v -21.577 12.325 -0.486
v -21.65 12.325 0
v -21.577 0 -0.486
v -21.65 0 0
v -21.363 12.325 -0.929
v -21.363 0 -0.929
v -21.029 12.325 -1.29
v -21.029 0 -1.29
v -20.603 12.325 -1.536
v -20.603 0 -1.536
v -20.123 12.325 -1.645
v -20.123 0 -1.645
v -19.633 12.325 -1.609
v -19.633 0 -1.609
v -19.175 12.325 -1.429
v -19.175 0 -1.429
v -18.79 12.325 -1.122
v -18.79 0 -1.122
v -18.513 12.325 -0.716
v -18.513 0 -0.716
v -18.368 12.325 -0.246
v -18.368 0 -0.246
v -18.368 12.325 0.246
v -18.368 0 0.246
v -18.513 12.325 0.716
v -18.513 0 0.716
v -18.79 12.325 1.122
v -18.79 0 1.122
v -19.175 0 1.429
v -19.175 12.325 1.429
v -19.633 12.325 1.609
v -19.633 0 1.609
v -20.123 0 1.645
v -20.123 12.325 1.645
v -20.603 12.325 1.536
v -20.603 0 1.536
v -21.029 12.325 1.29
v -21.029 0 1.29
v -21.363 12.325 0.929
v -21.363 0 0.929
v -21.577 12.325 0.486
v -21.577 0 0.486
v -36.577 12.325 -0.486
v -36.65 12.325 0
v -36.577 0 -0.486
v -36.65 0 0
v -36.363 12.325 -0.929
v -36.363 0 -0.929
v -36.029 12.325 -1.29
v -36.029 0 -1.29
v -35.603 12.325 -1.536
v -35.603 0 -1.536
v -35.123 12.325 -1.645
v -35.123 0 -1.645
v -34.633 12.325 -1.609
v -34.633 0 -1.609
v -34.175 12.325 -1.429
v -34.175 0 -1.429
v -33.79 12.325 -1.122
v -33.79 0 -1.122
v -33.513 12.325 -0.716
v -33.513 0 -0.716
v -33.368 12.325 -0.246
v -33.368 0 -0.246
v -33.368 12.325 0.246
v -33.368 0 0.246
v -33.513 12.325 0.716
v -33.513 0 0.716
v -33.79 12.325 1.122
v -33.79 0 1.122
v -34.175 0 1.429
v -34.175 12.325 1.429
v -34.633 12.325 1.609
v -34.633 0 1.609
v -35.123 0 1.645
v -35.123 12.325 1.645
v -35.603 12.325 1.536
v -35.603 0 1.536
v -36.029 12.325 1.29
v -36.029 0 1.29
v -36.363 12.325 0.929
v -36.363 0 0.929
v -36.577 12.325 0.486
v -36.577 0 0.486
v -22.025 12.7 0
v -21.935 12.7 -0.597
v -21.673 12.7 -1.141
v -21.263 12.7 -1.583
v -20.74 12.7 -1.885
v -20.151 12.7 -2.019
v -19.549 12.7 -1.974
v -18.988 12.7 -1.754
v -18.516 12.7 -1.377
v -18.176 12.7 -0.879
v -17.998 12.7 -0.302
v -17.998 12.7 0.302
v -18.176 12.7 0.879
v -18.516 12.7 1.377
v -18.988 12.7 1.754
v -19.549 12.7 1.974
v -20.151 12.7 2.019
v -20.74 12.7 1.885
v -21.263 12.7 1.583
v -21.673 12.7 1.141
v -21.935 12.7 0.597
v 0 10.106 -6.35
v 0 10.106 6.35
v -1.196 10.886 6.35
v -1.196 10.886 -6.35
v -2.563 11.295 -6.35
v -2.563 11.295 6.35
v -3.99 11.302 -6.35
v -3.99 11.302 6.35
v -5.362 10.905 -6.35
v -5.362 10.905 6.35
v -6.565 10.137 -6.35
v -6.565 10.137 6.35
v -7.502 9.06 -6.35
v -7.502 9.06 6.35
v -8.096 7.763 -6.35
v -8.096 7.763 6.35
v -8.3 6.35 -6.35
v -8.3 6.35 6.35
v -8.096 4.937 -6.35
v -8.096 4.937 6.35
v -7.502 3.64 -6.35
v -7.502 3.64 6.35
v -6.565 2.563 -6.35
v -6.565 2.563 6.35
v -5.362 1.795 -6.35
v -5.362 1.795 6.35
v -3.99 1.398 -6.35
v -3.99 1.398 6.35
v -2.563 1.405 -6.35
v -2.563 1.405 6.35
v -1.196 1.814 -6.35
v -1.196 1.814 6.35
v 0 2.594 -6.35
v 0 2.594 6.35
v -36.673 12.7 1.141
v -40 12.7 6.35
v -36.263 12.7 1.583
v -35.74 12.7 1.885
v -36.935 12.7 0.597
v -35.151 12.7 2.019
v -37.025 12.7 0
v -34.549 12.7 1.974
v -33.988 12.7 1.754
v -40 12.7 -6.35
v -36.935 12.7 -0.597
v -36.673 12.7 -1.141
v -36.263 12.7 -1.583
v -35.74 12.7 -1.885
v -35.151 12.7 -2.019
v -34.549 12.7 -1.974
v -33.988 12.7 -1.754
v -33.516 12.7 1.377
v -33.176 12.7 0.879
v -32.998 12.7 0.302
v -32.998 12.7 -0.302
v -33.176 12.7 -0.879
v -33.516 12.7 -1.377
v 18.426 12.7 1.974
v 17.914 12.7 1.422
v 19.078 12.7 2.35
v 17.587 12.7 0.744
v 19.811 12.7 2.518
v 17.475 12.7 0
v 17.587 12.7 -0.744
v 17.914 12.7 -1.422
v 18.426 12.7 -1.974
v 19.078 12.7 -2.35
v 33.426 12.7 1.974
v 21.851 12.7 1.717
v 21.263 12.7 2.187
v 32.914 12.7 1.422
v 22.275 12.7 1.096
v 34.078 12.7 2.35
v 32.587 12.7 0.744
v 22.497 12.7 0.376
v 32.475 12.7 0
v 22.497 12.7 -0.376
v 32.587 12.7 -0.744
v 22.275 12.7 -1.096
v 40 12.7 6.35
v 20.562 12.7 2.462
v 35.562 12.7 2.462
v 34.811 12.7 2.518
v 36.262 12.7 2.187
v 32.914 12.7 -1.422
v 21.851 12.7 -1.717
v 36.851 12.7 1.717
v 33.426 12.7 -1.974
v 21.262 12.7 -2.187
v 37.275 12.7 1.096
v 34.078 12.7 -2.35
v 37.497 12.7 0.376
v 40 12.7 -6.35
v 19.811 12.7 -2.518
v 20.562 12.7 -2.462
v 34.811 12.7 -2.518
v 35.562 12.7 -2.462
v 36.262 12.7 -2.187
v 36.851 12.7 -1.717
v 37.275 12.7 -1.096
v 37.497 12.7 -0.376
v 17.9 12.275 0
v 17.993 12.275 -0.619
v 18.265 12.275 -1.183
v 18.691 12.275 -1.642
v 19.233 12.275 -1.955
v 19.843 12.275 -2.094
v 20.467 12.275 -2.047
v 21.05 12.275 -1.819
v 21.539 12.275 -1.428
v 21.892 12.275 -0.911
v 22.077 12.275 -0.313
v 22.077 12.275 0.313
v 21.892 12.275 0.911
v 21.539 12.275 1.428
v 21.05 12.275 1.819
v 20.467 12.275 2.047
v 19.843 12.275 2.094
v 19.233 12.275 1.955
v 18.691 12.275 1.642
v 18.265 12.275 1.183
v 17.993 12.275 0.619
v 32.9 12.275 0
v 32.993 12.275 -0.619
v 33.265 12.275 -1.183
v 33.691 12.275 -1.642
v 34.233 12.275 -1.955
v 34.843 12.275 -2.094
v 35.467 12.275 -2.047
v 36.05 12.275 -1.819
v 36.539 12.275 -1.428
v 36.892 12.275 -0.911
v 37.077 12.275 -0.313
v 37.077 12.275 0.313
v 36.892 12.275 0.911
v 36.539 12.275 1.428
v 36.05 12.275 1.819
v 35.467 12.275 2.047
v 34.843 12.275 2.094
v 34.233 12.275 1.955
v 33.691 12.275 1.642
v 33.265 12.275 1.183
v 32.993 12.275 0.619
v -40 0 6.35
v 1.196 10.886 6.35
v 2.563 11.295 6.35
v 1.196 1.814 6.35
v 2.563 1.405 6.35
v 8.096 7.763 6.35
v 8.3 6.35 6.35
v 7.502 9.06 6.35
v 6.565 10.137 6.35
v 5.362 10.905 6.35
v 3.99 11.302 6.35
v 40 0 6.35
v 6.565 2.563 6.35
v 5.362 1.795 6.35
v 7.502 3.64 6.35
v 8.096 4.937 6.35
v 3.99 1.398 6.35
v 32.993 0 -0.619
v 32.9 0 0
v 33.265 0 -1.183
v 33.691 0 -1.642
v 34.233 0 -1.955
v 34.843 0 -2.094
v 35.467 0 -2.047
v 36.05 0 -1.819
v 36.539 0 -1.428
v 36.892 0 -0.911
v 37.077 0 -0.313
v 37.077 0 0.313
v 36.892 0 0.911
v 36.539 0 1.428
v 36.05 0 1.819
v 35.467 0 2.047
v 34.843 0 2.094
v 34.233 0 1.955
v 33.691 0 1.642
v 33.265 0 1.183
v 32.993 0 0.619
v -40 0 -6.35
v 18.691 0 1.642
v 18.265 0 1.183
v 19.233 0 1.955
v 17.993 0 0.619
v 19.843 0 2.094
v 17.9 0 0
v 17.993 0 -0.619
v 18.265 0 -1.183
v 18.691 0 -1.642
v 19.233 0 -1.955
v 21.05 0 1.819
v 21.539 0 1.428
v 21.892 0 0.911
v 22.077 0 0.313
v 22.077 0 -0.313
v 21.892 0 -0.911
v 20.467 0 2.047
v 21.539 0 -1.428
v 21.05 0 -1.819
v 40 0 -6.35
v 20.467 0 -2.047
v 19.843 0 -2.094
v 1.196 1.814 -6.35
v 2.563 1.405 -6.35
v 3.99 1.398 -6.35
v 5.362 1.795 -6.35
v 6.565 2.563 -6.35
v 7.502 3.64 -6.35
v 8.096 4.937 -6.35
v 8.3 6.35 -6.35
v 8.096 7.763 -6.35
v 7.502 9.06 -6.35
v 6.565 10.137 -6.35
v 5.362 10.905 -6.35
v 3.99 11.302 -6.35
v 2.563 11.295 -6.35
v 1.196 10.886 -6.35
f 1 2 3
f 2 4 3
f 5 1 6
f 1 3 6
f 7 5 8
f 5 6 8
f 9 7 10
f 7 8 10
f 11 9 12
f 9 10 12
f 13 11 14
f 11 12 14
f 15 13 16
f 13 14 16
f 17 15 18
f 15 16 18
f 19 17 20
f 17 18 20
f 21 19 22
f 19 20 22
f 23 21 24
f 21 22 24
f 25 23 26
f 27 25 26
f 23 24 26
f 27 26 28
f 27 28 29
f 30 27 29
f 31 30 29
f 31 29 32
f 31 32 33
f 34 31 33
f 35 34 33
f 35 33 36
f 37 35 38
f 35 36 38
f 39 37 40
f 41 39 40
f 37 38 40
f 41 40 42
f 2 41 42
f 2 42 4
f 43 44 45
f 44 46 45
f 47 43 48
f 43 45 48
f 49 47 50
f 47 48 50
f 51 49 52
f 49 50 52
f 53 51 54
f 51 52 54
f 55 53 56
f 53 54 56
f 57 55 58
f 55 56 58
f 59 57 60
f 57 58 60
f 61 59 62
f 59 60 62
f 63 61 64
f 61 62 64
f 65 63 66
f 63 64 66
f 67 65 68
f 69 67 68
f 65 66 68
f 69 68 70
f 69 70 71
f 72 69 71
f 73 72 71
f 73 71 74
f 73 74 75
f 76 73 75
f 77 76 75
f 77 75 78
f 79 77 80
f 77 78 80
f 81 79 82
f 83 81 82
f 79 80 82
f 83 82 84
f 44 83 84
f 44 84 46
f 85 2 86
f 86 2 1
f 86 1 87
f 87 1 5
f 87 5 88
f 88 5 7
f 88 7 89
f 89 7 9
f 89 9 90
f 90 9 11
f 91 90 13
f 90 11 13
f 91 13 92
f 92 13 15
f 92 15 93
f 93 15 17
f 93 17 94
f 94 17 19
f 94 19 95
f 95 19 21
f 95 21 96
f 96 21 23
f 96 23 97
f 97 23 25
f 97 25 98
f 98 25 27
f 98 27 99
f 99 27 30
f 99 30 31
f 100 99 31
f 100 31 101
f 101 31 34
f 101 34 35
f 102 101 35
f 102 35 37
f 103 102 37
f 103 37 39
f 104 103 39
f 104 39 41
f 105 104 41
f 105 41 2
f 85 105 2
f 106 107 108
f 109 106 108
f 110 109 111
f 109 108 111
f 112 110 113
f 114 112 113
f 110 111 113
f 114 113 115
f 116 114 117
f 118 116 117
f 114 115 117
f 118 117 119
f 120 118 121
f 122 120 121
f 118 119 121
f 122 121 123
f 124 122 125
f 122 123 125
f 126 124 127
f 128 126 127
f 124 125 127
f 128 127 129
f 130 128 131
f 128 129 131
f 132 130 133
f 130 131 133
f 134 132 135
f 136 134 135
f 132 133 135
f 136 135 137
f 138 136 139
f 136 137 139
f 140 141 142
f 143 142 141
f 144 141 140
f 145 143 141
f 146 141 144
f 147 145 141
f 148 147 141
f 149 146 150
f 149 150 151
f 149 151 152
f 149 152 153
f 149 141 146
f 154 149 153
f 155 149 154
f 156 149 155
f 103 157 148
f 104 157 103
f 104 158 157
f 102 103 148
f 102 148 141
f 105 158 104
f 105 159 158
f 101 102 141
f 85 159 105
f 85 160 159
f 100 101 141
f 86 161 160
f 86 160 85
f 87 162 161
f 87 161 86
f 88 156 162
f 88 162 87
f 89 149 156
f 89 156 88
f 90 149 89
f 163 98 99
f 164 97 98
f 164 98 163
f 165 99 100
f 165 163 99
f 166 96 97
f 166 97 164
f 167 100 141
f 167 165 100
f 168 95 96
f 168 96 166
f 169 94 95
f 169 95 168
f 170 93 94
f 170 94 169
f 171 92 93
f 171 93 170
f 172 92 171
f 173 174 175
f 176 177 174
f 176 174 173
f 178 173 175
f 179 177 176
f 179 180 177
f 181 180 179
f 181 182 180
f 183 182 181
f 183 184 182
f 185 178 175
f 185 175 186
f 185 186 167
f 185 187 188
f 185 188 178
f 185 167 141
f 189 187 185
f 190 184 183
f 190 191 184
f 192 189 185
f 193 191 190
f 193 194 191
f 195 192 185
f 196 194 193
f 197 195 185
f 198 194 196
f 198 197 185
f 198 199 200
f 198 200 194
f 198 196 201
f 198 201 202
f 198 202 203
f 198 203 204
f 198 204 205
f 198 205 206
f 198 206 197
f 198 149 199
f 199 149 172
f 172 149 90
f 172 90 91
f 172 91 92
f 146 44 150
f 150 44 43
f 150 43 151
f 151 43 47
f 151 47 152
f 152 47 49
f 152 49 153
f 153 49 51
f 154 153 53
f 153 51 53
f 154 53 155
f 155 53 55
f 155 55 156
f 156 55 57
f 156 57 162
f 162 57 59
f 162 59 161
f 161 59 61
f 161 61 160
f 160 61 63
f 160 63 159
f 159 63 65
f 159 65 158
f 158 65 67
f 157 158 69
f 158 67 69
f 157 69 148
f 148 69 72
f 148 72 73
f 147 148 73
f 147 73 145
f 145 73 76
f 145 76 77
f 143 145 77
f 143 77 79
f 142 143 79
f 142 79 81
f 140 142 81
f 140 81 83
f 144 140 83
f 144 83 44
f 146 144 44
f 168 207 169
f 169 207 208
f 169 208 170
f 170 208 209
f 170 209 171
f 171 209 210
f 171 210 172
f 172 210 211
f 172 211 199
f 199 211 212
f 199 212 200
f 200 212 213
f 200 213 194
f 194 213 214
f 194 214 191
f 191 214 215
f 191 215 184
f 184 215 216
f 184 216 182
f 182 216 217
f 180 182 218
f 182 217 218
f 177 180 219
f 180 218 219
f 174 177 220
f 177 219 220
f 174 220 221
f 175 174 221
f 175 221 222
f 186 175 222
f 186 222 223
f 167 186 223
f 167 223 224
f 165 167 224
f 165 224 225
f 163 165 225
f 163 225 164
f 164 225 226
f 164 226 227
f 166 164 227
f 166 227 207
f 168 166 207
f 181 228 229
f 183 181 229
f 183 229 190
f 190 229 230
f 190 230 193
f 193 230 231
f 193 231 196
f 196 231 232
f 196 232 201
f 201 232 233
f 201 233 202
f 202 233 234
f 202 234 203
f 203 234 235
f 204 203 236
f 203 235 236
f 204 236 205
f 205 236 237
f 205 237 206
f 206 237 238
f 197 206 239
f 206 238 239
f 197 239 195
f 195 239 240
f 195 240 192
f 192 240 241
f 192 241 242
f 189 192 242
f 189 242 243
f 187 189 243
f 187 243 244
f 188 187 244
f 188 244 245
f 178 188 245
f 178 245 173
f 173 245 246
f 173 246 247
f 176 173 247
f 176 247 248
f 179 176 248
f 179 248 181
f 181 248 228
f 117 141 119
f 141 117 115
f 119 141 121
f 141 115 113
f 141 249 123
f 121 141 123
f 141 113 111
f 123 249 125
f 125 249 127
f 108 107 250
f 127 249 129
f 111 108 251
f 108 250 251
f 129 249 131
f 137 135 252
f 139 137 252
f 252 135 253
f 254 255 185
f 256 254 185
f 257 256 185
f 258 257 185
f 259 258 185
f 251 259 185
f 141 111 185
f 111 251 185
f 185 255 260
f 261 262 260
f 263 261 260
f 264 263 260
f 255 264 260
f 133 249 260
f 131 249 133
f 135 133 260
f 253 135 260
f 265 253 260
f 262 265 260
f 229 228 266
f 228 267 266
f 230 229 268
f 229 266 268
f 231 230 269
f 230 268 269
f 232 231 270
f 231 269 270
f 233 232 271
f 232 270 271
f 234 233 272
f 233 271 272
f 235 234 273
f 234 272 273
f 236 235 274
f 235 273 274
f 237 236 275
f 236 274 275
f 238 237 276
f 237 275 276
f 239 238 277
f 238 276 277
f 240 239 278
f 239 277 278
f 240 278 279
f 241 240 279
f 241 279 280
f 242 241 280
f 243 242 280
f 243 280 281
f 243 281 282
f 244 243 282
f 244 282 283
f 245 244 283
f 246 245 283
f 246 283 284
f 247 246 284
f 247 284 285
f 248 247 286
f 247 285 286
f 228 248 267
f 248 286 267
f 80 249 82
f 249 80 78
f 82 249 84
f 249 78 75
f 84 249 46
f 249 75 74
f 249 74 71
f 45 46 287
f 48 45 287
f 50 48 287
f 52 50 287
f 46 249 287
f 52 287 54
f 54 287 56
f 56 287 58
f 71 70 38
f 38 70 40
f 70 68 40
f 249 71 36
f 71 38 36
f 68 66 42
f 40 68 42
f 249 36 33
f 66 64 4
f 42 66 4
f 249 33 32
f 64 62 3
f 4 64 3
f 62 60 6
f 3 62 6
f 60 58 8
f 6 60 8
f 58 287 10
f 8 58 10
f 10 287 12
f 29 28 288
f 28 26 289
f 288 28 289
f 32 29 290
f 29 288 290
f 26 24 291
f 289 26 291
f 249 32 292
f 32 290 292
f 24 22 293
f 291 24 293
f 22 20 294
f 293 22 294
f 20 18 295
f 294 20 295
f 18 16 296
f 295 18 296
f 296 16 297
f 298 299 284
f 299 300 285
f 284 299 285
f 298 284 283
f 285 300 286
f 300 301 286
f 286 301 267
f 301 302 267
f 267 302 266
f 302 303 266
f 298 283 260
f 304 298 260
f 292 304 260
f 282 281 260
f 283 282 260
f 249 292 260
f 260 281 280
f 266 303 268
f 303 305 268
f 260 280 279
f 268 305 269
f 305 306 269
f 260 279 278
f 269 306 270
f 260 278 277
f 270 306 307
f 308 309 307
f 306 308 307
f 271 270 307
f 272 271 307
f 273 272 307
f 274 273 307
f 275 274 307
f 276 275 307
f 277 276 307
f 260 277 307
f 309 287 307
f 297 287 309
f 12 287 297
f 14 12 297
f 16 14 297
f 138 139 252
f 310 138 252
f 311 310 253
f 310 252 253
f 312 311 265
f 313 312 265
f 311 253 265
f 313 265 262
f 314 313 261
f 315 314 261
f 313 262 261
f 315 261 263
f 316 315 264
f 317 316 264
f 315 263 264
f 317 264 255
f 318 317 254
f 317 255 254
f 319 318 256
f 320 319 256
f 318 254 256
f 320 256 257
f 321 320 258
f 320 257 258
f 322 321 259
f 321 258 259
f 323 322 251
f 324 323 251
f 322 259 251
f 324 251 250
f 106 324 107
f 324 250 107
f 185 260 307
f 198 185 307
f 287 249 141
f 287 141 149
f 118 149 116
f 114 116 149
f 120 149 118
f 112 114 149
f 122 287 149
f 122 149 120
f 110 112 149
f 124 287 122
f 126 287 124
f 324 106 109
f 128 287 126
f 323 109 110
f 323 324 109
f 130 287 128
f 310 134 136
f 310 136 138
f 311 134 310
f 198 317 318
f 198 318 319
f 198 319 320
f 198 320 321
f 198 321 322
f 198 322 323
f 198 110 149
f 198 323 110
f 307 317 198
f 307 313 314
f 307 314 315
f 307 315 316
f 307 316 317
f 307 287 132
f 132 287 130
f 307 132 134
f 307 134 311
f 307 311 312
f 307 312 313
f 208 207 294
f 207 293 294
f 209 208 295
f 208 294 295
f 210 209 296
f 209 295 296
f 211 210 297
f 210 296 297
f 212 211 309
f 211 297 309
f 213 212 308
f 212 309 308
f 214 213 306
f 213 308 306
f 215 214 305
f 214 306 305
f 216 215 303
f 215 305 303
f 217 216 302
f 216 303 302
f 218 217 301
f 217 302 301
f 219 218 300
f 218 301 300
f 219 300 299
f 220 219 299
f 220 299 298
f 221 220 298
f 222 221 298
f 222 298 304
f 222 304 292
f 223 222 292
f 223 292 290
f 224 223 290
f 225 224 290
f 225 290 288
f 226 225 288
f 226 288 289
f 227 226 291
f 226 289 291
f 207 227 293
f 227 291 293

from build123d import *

# Parameters (mm, degrees)
SKETCH1_W                   = 80
SKETCH1_H                   = 12.7
BOSS_EXTRUDE1_DEPTH         = 12.7
CUT_EXTRUDE1_DEPTH          = 44.847234804
M4_TAPPED_HOLE2_D           = 3.3
M4_TAPPED_HOLE2_CSINK_D     = 4.05
M4_TAPPED_HOLE2_CSINK_ANGLE = 90
M5_TAPPED_HOLE1_D           = 4.2
M5_TAPPED_HOLE1_CSINK_D     = 5.05
M5_TAPPED_HOLE1_CSINK_ANGLE = 90


with BuildPart() as part:
    # Sketch1 → Boss-Extrude1 (new body)
    with BuildSketch(Plane(origin=(0, 0, 0), x_dir=(1, 0, 0), z_dir=(0, 1, 0))):
        Rectangle(SKETCH1_W, SKETCH1_H)
    extrude(amount=BOSS_EXTRUDE1_DEPTH)

    # Sketch4 → Cut-Extrude1 (cut, through all)
    with BuildSketch(Plane.XY.offset(6.35)):
        with BuildLine():
            ThreePointArc((0, 2.593672006), (8.3, 6.35), (0, 10.106327994))
            ThreePointArc((0, 10.106327994), (-8.3, 6.35), (0, 2.593672006))
        make_face()
    extrude(amount=-CUT_EXTRUDE1_DEPTH, mode=Mode.SUBTRACT)

    # M4 Tapped Hole2 (through all)
    with Locations(Plane(origin=(0, 12.7, 0), x_dir=(1, 0, 0), z_dir=(0, 1, 0))):
        with Locations((-35, 0), (-20, 0)):
            CounterSinkHole(M4_TAPPED_HOLE2_D / 2, M4_TAPPED_HOLE2_CSINK_D / 2, counter_sink_angle=M4_TAPPED_HOLE2_CSINK_ANGLE)

    # M5 Tapped Hole1 (through all)
    with Locations(Plane(origin=(0, 12.7, 0), x_dir=(1, 0, 0), z_dir=(0, 1, 0))):
        with Locations((35, 0), (20, 0)):
            CounterSinkHole(M5_TAPPED_HOLE1_D / 2, M5_TAPPED_HOLE1_CSINK_D / 2, counter_sink_angle=M5_TAPPED_HOLE1_CSINK_ANGLE)


solid = part.part
